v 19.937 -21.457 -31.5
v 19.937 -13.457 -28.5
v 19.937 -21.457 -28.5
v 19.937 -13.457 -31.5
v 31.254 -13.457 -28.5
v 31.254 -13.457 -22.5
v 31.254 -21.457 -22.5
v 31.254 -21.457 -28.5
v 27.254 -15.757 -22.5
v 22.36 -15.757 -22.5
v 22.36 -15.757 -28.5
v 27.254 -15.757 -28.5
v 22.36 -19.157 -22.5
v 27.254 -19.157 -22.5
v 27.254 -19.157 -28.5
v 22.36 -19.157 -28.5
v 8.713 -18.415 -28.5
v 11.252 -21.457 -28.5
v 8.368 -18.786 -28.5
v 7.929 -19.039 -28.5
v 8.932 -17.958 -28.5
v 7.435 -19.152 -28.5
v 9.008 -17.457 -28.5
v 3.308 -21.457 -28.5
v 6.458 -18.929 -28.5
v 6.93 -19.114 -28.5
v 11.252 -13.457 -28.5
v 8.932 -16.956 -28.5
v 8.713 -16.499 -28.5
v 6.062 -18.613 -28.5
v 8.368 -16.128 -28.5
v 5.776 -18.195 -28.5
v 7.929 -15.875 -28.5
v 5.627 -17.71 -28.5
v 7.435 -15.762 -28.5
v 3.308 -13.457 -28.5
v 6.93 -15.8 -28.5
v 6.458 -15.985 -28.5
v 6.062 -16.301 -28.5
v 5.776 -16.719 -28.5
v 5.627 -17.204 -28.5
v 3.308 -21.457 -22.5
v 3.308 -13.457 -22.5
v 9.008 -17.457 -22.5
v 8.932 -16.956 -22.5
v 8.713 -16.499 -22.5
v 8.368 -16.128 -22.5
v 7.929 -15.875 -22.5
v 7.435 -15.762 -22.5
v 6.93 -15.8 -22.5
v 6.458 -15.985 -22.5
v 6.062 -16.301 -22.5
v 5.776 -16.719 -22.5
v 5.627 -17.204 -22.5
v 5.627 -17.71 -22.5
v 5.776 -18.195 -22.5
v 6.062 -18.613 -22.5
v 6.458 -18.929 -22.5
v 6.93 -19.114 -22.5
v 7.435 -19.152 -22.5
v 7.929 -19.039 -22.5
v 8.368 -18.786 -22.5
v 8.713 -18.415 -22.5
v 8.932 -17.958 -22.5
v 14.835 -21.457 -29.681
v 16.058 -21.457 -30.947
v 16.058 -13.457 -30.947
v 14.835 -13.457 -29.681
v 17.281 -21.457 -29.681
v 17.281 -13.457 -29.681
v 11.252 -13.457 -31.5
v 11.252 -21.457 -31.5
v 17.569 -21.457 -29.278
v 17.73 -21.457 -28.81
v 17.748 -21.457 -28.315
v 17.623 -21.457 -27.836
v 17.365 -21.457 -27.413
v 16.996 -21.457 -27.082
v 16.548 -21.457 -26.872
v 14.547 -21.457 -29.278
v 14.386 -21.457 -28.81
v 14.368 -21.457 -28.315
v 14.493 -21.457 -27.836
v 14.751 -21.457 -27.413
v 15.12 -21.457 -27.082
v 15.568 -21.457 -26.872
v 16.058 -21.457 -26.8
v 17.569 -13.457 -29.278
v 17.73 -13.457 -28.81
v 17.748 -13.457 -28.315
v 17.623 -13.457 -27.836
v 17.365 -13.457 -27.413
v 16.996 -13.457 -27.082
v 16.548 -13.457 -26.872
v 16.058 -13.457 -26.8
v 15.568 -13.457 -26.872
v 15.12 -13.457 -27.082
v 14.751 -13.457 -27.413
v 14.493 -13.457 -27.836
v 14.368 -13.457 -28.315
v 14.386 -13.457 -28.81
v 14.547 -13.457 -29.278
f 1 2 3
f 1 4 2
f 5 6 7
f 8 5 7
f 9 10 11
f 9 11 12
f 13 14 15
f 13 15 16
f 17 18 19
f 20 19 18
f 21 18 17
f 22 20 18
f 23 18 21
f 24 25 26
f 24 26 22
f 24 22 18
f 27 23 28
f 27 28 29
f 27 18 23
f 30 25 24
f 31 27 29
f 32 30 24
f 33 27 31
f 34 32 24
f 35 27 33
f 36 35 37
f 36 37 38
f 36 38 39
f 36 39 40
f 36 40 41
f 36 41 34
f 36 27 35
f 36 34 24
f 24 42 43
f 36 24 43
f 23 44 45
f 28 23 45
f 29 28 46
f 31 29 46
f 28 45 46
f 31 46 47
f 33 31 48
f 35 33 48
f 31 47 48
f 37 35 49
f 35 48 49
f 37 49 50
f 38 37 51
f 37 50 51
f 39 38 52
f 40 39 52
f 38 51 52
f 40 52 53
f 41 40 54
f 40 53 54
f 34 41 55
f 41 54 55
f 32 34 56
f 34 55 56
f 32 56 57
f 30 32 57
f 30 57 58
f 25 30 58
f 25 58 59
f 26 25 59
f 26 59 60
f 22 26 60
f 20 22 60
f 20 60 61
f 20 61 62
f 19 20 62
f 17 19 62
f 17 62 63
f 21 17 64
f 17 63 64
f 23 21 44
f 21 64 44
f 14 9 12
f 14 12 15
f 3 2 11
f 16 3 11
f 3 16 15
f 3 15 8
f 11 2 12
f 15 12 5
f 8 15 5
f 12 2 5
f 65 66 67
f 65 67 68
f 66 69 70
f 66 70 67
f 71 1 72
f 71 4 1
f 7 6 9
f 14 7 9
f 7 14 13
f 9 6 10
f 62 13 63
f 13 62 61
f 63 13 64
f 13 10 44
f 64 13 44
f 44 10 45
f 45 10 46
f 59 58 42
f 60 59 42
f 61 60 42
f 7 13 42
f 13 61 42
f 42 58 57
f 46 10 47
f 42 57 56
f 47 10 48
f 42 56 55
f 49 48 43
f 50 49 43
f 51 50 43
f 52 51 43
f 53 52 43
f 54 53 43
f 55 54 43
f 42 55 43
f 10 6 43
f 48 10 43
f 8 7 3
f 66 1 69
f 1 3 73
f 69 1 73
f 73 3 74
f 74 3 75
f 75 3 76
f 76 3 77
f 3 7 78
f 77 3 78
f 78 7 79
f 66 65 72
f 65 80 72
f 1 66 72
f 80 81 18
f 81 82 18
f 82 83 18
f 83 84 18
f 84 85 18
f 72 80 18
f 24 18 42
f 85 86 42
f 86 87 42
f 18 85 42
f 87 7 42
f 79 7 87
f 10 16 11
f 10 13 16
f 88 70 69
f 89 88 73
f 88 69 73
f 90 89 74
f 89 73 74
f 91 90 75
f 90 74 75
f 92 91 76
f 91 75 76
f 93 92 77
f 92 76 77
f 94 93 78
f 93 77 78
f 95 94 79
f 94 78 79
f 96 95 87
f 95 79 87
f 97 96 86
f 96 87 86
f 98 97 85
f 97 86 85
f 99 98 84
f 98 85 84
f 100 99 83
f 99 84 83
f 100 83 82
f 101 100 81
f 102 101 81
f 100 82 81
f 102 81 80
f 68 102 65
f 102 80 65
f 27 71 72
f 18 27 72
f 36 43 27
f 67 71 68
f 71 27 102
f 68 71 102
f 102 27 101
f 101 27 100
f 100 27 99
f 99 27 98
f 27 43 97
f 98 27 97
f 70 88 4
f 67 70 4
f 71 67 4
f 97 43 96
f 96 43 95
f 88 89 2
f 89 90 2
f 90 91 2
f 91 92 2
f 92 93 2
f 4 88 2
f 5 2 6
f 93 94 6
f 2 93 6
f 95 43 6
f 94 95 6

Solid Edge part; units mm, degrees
sketch "Sketch1" plane through (0, 0, -22.5) normal (0, 0, 1) x (1, 0, 0)
  line L0 (22.3605, -19.157) -> (22.3605, -15.757)
  line L1 (22.3605, -15.757) -> (27.2537, -15.757)
  line L2 (27.2537, -15.757) -> (27.2537, -19.157)
  line L3 (27.2537, -19.157) -> (22.3605, -19.157)
  line L4 (3.308, -13.457) -> (31.2537, -13.457)
  line L5 (31.2537, -13.457) -> (31.2537, -21.457)
  line L6 (31.2537, -21.457) -> (3.308, -21.457)
  line L7 (3.308, -21.457) -> (3.308, -13.457)
  circle A0 centre (7.308, -17.457) radius 1.7
  dimension "D1" = 4
  dimension "D2" = 4
  dimension "D3" = 4
  dimension "D4" = 4
extrude "ExtrudedProtrusion_1" add sketch "Sketch1" against normal blind 9
sketch "Sketch2" plane through (17.2808, -21.457, -27.5) normal (0, -1, 0) x (0, 0, -1)
  line L0 (2.1809, 0) -> (3.4472, -1.2228)
  line L1 (3.4472, -1.2228) -> (2.1809, -2.4457)
  arc A0 (2.1809, -2.4457) -> (2.1809, 0) centre (1, -1.2228) cw
  dimension "D1" = 3.4
  dimension "D2" = 6
extrude "Cutout1" cut sketch "Sketch2" against normal up to next
sketch "Sketch3" plane through (17.2808, -17.457, -31.5) normal (0, 0, -1) x (0, 1, 0)
  line L0 (-9.6759, 16.4709) -> (6.2372, 16.4709)
  line L1 (6.2372, 16.4709) -> (6.2372, 2.6566)
  line L2 (6.2372, 2.6566) -> (-9.6759, 2.6566)
  line L3 (-9.6759, 2.6566) -> (-9.6759, 16.4709)
  line L4 (6.2372, -6.0293) -> (-9.6759, -6.0293)
  line L5 (-9.6759, -6.0293) -> (-9.6759, -15.1311)
  line L6 (-9.6759, -15.1311) -> (6.2372, -15.1311)
  line L7 (6.2372, -15.1311) -> (6.2372, -6.0293)
extrude "ExtrudedCutout_2" cut sketch "Sketch3" against normal blind 3
